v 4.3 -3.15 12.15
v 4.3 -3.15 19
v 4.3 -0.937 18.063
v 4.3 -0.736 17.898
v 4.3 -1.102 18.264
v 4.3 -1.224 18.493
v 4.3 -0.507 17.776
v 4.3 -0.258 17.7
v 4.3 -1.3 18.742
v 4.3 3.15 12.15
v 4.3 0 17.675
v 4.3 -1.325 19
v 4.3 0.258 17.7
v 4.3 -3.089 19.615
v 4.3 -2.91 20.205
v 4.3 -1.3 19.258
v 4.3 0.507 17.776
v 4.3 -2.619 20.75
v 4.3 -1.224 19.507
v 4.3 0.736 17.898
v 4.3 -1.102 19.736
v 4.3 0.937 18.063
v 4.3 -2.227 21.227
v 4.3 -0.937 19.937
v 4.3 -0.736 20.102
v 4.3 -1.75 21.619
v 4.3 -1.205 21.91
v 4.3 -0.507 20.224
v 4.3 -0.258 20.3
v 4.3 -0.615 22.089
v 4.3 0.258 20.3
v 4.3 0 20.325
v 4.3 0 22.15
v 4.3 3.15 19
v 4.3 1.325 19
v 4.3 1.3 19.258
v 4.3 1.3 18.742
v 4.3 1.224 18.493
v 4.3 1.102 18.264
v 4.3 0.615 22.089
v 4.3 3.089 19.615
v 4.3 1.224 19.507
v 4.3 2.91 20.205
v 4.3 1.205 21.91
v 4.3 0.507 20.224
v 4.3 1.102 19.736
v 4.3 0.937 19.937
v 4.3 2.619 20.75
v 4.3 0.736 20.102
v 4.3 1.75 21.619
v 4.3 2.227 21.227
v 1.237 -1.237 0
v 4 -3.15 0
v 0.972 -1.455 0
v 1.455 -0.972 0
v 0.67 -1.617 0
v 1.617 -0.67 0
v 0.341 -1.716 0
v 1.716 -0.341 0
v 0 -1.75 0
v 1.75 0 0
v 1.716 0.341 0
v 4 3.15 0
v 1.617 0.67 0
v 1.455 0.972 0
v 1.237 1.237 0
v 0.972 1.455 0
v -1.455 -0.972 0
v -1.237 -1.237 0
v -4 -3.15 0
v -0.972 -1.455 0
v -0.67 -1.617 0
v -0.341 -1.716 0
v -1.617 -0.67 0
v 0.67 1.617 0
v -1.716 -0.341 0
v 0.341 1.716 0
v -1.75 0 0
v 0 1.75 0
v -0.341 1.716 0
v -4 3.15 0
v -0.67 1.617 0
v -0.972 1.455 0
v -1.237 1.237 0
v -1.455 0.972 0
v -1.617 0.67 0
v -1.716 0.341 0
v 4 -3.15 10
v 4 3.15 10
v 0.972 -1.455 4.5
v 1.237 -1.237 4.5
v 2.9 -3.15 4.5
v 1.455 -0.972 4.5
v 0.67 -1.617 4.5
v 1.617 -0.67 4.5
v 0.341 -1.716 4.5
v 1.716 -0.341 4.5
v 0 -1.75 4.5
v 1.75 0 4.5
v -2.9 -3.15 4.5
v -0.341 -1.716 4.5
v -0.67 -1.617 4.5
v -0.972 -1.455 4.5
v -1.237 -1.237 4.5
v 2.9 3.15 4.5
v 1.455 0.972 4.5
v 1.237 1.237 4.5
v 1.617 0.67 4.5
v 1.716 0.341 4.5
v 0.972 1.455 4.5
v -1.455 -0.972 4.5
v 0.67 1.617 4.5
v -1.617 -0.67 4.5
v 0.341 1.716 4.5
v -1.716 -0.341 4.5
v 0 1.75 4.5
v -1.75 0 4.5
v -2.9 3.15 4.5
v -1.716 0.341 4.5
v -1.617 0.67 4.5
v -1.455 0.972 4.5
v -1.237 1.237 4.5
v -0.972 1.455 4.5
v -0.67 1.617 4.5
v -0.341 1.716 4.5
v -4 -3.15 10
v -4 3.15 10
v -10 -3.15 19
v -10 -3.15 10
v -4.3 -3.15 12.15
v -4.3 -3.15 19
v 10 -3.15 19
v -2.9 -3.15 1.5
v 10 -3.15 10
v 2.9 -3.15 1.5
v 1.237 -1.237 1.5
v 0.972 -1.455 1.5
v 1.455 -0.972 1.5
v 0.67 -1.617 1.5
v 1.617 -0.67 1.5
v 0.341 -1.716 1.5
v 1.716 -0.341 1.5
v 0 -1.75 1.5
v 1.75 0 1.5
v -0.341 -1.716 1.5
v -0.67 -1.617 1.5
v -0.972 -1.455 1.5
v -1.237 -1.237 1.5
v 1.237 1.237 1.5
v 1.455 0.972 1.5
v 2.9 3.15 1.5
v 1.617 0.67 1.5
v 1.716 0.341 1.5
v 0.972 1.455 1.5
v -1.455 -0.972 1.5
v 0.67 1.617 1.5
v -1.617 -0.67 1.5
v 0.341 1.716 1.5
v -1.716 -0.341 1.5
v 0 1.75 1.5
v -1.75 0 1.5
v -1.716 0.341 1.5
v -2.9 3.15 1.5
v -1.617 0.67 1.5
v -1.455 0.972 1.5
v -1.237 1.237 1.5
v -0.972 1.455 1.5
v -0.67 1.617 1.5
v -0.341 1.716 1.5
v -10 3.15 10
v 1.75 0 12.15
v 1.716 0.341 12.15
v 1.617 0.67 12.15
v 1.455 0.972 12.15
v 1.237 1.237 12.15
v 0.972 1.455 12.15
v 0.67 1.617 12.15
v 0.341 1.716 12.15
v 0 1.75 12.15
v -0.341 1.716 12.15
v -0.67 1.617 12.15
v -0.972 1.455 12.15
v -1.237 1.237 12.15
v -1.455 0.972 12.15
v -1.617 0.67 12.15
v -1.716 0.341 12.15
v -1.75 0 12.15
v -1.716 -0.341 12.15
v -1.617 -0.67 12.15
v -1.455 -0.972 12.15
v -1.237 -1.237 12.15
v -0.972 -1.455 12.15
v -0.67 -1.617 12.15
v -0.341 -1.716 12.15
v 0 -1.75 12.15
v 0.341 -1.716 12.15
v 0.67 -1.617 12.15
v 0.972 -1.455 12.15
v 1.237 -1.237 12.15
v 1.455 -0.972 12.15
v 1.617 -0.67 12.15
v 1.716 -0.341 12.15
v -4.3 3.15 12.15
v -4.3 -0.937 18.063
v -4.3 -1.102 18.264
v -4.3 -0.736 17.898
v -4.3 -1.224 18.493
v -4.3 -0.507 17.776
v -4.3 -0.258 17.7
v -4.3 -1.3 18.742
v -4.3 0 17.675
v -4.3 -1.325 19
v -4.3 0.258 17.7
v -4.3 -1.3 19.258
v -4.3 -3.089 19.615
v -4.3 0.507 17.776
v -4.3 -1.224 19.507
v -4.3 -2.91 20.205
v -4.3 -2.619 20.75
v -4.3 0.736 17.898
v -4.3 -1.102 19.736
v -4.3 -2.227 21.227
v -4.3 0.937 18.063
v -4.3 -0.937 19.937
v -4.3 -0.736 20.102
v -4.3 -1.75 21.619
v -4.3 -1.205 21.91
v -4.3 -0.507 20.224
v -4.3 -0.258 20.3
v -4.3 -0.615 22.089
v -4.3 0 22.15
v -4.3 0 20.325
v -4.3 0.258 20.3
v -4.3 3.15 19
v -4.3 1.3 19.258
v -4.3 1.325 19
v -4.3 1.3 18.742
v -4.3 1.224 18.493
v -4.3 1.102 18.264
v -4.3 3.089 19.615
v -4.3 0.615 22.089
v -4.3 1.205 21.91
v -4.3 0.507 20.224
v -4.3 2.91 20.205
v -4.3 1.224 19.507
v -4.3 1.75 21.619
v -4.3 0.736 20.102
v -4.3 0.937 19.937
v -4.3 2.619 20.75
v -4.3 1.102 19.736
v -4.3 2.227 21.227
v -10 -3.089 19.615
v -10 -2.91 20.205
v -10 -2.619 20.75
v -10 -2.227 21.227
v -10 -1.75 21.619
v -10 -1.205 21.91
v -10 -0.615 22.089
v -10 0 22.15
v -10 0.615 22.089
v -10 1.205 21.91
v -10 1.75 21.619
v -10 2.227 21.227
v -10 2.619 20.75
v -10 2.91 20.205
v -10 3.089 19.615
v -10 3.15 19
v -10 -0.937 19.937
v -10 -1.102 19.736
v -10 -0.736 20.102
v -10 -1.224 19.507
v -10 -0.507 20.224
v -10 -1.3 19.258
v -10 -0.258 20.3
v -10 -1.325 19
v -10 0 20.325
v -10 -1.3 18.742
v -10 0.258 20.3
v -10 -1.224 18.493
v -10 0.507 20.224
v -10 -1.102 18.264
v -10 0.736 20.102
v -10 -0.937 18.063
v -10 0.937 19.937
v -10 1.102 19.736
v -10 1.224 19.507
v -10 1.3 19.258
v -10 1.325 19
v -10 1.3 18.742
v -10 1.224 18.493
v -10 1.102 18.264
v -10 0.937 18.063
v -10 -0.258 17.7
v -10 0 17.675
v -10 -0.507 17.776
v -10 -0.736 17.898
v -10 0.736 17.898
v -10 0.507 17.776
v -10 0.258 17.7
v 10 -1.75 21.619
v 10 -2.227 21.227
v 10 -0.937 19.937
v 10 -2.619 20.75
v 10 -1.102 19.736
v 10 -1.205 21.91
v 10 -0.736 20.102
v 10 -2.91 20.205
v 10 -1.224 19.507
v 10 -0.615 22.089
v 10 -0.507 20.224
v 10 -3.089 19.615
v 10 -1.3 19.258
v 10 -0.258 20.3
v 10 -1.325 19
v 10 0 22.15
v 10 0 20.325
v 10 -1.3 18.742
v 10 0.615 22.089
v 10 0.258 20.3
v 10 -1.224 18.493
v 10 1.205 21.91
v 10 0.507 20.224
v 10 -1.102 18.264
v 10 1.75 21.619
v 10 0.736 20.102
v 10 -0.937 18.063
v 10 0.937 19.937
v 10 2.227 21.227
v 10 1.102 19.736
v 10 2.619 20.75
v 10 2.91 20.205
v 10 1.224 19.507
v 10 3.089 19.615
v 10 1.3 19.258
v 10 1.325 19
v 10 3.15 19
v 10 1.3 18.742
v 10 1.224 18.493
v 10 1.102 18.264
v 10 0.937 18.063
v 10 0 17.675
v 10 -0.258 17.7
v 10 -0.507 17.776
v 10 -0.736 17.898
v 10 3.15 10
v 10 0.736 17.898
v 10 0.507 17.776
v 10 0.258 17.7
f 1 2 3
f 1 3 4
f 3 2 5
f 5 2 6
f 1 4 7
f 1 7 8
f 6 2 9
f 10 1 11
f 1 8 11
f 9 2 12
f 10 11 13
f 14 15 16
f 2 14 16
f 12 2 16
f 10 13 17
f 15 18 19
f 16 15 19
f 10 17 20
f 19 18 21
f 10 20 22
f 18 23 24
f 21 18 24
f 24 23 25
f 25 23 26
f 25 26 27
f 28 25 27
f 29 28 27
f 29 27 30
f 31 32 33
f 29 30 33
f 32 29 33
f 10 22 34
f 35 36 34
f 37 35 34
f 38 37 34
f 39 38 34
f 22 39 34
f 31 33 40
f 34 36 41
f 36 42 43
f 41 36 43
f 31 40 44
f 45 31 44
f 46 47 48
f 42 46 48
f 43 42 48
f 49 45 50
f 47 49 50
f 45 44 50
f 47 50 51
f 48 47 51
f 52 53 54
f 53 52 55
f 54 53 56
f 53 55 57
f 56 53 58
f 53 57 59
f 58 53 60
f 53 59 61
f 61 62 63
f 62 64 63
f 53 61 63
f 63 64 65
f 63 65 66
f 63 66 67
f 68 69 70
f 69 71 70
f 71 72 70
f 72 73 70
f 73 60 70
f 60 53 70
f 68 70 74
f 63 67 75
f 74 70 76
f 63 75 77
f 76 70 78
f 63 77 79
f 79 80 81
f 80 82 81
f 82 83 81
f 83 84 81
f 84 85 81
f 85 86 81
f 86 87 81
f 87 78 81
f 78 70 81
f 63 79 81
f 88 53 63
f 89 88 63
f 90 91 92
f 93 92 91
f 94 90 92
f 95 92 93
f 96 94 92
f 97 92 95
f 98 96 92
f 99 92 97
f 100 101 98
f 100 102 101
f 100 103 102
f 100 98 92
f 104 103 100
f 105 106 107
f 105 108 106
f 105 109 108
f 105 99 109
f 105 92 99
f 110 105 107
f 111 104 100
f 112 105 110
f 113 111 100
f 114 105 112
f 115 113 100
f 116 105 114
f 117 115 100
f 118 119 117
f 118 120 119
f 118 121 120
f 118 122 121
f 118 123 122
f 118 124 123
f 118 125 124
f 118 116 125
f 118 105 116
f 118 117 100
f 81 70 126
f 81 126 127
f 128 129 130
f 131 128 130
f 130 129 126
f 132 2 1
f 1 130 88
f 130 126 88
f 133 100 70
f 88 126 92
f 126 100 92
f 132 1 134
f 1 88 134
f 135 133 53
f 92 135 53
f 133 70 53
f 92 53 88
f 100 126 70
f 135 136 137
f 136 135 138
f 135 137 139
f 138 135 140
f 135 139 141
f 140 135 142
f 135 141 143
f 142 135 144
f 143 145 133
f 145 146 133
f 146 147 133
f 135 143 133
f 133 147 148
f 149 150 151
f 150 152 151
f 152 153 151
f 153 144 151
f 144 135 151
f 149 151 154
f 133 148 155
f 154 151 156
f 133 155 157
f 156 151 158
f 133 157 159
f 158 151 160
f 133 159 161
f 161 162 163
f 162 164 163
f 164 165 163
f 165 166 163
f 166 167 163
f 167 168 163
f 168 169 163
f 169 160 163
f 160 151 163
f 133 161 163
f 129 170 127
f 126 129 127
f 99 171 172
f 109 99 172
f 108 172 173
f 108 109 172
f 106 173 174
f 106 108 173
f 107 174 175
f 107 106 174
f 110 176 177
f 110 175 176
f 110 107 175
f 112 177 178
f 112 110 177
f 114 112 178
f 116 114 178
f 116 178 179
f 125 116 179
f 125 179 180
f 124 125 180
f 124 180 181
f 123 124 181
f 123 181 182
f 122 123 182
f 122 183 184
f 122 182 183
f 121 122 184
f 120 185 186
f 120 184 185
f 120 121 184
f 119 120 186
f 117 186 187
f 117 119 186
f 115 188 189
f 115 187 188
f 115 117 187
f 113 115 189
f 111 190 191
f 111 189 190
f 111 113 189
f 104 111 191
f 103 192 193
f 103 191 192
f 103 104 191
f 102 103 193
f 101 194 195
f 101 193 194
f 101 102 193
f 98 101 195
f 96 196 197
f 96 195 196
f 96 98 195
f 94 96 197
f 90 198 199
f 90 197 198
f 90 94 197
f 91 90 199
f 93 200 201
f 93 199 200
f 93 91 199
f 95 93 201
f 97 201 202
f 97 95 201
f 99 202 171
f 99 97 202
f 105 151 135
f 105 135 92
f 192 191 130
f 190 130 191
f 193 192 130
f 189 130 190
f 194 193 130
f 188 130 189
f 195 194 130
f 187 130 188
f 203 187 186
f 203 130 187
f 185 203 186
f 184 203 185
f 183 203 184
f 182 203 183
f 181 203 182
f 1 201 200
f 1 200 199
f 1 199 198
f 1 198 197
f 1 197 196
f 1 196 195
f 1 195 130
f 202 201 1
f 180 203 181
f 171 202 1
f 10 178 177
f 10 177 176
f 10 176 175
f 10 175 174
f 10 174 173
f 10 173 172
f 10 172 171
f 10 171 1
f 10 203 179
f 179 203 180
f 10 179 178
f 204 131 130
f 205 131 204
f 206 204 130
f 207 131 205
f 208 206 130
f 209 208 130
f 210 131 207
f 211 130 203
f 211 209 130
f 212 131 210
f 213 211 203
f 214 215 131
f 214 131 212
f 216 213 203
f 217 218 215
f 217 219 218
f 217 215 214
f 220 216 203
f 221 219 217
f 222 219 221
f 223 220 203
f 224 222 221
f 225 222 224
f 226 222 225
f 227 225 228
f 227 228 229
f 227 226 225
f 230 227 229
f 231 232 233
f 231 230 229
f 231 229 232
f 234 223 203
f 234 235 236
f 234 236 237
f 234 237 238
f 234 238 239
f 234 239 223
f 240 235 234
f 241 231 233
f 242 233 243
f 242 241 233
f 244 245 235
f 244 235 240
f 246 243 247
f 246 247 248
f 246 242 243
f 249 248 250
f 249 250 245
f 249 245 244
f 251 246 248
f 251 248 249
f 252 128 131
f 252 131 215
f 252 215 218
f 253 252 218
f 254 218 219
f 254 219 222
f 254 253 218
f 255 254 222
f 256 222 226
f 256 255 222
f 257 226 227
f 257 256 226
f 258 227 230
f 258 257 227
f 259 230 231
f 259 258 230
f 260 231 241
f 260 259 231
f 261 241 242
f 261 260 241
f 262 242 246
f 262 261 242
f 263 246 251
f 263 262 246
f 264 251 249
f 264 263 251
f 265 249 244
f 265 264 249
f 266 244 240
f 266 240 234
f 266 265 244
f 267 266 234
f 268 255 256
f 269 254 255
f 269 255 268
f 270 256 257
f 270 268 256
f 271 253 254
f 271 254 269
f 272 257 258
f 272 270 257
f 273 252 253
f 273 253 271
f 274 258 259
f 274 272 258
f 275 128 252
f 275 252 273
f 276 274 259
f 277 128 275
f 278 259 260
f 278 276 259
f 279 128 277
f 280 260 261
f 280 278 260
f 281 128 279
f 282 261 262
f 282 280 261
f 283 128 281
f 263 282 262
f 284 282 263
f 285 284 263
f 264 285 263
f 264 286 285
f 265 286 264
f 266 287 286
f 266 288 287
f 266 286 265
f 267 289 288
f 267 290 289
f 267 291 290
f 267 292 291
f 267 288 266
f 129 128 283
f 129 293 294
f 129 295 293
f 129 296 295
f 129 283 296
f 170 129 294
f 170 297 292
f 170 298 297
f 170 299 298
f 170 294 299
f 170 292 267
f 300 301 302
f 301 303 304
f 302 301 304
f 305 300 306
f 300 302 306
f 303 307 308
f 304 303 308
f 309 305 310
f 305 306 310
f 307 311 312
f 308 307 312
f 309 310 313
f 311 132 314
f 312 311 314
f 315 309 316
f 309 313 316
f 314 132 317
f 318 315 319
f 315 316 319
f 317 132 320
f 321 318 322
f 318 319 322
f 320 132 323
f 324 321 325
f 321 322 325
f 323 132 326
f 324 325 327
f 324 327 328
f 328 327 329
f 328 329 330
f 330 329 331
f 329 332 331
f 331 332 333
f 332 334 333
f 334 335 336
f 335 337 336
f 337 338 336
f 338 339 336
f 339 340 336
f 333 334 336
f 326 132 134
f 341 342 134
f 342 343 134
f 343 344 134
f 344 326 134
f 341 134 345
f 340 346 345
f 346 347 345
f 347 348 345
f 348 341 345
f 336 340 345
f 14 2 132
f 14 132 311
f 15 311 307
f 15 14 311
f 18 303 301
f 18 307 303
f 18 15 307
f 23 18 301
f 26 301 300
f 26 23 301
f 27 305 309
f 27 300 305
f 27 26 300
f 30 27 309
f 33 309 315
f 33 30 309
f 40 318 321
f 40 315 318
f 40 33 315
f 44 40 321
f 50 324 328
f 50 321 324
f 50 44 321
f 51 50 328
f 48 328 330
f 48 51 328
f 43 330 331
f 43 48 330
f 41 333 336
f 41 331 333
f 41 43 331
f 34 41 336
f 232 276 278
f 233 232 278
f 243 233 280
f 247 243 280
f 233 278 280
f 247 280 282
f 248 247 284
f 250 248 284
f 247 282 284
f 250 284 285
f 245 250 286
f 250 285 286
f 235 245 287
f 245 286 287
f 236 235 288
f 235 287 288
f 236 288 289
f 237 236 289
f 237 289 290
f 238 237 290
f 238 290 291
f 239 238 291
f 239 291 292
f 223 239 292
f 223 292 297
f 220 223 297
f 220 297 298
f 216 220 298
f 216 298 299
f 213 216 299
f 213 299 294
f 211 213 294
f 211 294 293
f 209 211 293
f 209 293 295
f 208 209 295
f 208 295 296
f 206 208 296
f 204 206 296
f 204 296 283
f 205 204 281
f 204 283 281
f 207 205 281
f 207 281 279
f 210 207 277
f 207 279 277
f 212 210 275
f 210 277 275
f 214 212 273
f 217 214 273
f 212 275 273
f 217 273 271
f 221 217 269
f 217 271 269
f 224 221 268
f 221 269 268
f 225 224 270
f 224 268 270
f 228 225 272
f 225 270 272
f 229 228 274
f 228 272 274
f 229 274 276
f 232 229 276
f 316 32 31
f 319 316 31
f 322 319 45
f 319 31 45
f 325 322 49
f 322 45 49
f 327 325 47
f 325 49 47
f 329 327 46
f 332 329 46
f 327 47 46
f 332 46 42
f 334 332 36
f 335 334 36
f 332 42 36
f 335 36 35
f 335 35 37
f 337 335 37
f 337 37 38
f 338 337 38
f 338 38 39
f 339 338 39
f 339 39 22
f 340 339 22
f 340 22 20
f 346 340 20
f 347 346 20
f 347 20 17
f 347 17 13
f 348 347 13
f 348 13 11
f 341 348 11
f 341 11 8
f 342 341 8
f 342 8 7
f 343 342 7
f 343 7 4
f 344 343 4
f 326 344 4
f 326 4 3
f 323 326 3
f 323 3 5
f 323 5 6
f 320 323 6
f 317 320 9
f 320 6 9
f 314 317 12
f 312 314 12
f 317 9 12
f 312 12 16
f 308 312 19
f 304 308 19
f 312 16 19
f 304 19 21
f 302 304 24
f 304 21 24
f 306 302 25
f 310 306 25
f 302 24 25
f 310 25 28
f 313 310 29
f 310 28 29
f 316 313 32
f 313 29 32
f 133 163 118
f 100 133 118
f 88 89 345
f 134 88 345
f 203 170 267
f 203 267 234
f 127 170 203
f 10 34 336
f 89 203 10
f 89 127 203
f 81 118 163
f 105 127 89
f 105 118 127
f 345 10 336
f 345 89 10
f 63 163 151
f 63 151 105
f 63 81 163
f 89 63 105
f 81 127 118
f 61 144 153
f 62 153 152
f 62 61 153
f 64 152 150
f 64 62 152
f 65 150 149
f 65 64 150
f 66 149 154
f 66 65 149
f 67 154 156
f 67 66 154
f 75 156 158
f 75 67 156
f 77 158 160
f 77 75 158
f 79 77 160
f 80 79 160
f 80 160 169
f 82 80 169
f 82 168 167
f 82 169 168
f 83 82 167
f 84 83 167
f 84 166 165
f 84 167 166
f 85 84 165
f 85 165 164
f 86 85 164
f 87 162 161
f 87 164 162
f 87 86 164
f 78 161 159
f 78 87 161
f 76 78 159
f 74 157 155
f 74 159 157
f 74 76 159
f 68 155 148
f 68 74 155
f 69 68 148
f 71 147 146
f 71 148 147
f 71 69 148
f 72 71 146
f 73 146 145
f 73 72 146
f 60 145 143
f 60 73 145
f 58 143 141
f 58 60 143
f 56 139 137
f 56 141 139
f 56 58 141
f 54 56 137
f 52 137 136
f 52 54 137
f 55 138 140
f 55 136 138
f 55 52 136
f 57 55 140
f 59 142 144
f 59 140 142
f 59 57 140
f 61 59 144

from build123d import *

# Parameters (mm, degrees)
SKETCH1_W           = 6.3
SKETCH1_H           = 8
SKETCH1_R           = 1.75
BOSS_EXTRUDE1_DEPTH = 10
SKETCH2_W           = 20
SKETCH2_H           = 6.3
SKETCH2_R           = 1.75
BOSS_EXTRUDE2_DEPTH = 12.15
SKETCH3_R           = 1.325
CUT_EXTRUDE1_DEPTH  = 31.009081959
SKETCH4_W           = 8.6
SKETCH4_H           = 6.3
CUT_EXTRUDE2_DEPTH  = 10
CUT_EXTRUDE3_DEPTH  = 31.009081959
SKETCH13_W          = 5.8
SKETCH13_H          = 3
CUT_EXTRUDE4_DEPTH  = 26.106025173


with BuildPart() as part:
    # Sketch1 → Boss-Extrude1 (new body)
    with BuildSketch(Plane(origin=(0, 0, 0), x_dir=(0, 1, 0), z_dir=(0, 0, 1))):
        Rectangle(SKETCH1_W, SKETCH1_H)
        with Locations(Location((0, 0, 0), (0, 0, 270))):
            Circle(SKETCH1_R, mode=Mode.SUBTRACT)
    extrude(amount=BOSS_EXTRUDE1_DEPTH)

    # Sketch2 → Boss-Extrude2 (add)
    with BuildSketch(Plane.XY.offset(10)):
        Rectangle(SKETCH2_W, SKETCH2_H)
        Circle(SKETCH2_R, mode=Mode.SUBTRACT)
    extrude(amount=BOSS_EXTRUDE2_DEPTH)

    # Sketch3 → Cut-Extrude1 (cut, through all)
    with BuildSketch(Plane(origin=(-10, 0, 0), x_dir=(0, -1, 0), z_dir=(-1, 0, 0))):
        with Locations(Location((0, 19, 0), (0, 0, 90))):
            Circle(SKETCH3_R)
    extrude(amount=-CUT_EXTRUDE1_DEPTH, mode=Mode.SUBTRACT)

    # Sketch4 → Cut-Extrude2 (cut)
    with BuildSketch(Plane.XY.offset(22.15)):
        Rectangle(SKETCH4_W, SKETCH4_H)
    extrude(amount=-CUT_EXTRUDE2_DEPTH, mode=Mode.SUBTRACT)

    # Sketch11 → Cut-Extrude3 (cut, through all)
    with BuildSketch(Plane(origin=(-10, 0, 0), x_dir=(0, -1, 0), z_dir=(-1, 0, 0))):
        with BuildLine():
            Line((-3.15, 19), (-3.15, 24.112369899))
            Line((-3.15, 24.112369899), (3.15, 24.112369899))
            Line((3.15, 24.112369899), (3.15, 19))
            ThreePointArc((3.15, 19), (0, 22.15), (-3.15, 19))
        make_face()
    extrude(amount=-CUT_EXTRUDE3_DEPTH, mode=Mode.SUBTRACT)

    # Sketch13 → Cut-Extrude4 (cut, through all)
    with BuildSketch(Plane(origin=(0, 3.15, 0), x_dir=(-1, 0, 0), z_dir=(0, 1, 0))):
        with Locations((0, 3)):
            Rectangle(SKETCH13_W, SKETCH13_H)
    extrude(amount=-CUT_EXTRUDE4_DEPTH, mode=Mode.SUBTRACT)


solid = part.part
